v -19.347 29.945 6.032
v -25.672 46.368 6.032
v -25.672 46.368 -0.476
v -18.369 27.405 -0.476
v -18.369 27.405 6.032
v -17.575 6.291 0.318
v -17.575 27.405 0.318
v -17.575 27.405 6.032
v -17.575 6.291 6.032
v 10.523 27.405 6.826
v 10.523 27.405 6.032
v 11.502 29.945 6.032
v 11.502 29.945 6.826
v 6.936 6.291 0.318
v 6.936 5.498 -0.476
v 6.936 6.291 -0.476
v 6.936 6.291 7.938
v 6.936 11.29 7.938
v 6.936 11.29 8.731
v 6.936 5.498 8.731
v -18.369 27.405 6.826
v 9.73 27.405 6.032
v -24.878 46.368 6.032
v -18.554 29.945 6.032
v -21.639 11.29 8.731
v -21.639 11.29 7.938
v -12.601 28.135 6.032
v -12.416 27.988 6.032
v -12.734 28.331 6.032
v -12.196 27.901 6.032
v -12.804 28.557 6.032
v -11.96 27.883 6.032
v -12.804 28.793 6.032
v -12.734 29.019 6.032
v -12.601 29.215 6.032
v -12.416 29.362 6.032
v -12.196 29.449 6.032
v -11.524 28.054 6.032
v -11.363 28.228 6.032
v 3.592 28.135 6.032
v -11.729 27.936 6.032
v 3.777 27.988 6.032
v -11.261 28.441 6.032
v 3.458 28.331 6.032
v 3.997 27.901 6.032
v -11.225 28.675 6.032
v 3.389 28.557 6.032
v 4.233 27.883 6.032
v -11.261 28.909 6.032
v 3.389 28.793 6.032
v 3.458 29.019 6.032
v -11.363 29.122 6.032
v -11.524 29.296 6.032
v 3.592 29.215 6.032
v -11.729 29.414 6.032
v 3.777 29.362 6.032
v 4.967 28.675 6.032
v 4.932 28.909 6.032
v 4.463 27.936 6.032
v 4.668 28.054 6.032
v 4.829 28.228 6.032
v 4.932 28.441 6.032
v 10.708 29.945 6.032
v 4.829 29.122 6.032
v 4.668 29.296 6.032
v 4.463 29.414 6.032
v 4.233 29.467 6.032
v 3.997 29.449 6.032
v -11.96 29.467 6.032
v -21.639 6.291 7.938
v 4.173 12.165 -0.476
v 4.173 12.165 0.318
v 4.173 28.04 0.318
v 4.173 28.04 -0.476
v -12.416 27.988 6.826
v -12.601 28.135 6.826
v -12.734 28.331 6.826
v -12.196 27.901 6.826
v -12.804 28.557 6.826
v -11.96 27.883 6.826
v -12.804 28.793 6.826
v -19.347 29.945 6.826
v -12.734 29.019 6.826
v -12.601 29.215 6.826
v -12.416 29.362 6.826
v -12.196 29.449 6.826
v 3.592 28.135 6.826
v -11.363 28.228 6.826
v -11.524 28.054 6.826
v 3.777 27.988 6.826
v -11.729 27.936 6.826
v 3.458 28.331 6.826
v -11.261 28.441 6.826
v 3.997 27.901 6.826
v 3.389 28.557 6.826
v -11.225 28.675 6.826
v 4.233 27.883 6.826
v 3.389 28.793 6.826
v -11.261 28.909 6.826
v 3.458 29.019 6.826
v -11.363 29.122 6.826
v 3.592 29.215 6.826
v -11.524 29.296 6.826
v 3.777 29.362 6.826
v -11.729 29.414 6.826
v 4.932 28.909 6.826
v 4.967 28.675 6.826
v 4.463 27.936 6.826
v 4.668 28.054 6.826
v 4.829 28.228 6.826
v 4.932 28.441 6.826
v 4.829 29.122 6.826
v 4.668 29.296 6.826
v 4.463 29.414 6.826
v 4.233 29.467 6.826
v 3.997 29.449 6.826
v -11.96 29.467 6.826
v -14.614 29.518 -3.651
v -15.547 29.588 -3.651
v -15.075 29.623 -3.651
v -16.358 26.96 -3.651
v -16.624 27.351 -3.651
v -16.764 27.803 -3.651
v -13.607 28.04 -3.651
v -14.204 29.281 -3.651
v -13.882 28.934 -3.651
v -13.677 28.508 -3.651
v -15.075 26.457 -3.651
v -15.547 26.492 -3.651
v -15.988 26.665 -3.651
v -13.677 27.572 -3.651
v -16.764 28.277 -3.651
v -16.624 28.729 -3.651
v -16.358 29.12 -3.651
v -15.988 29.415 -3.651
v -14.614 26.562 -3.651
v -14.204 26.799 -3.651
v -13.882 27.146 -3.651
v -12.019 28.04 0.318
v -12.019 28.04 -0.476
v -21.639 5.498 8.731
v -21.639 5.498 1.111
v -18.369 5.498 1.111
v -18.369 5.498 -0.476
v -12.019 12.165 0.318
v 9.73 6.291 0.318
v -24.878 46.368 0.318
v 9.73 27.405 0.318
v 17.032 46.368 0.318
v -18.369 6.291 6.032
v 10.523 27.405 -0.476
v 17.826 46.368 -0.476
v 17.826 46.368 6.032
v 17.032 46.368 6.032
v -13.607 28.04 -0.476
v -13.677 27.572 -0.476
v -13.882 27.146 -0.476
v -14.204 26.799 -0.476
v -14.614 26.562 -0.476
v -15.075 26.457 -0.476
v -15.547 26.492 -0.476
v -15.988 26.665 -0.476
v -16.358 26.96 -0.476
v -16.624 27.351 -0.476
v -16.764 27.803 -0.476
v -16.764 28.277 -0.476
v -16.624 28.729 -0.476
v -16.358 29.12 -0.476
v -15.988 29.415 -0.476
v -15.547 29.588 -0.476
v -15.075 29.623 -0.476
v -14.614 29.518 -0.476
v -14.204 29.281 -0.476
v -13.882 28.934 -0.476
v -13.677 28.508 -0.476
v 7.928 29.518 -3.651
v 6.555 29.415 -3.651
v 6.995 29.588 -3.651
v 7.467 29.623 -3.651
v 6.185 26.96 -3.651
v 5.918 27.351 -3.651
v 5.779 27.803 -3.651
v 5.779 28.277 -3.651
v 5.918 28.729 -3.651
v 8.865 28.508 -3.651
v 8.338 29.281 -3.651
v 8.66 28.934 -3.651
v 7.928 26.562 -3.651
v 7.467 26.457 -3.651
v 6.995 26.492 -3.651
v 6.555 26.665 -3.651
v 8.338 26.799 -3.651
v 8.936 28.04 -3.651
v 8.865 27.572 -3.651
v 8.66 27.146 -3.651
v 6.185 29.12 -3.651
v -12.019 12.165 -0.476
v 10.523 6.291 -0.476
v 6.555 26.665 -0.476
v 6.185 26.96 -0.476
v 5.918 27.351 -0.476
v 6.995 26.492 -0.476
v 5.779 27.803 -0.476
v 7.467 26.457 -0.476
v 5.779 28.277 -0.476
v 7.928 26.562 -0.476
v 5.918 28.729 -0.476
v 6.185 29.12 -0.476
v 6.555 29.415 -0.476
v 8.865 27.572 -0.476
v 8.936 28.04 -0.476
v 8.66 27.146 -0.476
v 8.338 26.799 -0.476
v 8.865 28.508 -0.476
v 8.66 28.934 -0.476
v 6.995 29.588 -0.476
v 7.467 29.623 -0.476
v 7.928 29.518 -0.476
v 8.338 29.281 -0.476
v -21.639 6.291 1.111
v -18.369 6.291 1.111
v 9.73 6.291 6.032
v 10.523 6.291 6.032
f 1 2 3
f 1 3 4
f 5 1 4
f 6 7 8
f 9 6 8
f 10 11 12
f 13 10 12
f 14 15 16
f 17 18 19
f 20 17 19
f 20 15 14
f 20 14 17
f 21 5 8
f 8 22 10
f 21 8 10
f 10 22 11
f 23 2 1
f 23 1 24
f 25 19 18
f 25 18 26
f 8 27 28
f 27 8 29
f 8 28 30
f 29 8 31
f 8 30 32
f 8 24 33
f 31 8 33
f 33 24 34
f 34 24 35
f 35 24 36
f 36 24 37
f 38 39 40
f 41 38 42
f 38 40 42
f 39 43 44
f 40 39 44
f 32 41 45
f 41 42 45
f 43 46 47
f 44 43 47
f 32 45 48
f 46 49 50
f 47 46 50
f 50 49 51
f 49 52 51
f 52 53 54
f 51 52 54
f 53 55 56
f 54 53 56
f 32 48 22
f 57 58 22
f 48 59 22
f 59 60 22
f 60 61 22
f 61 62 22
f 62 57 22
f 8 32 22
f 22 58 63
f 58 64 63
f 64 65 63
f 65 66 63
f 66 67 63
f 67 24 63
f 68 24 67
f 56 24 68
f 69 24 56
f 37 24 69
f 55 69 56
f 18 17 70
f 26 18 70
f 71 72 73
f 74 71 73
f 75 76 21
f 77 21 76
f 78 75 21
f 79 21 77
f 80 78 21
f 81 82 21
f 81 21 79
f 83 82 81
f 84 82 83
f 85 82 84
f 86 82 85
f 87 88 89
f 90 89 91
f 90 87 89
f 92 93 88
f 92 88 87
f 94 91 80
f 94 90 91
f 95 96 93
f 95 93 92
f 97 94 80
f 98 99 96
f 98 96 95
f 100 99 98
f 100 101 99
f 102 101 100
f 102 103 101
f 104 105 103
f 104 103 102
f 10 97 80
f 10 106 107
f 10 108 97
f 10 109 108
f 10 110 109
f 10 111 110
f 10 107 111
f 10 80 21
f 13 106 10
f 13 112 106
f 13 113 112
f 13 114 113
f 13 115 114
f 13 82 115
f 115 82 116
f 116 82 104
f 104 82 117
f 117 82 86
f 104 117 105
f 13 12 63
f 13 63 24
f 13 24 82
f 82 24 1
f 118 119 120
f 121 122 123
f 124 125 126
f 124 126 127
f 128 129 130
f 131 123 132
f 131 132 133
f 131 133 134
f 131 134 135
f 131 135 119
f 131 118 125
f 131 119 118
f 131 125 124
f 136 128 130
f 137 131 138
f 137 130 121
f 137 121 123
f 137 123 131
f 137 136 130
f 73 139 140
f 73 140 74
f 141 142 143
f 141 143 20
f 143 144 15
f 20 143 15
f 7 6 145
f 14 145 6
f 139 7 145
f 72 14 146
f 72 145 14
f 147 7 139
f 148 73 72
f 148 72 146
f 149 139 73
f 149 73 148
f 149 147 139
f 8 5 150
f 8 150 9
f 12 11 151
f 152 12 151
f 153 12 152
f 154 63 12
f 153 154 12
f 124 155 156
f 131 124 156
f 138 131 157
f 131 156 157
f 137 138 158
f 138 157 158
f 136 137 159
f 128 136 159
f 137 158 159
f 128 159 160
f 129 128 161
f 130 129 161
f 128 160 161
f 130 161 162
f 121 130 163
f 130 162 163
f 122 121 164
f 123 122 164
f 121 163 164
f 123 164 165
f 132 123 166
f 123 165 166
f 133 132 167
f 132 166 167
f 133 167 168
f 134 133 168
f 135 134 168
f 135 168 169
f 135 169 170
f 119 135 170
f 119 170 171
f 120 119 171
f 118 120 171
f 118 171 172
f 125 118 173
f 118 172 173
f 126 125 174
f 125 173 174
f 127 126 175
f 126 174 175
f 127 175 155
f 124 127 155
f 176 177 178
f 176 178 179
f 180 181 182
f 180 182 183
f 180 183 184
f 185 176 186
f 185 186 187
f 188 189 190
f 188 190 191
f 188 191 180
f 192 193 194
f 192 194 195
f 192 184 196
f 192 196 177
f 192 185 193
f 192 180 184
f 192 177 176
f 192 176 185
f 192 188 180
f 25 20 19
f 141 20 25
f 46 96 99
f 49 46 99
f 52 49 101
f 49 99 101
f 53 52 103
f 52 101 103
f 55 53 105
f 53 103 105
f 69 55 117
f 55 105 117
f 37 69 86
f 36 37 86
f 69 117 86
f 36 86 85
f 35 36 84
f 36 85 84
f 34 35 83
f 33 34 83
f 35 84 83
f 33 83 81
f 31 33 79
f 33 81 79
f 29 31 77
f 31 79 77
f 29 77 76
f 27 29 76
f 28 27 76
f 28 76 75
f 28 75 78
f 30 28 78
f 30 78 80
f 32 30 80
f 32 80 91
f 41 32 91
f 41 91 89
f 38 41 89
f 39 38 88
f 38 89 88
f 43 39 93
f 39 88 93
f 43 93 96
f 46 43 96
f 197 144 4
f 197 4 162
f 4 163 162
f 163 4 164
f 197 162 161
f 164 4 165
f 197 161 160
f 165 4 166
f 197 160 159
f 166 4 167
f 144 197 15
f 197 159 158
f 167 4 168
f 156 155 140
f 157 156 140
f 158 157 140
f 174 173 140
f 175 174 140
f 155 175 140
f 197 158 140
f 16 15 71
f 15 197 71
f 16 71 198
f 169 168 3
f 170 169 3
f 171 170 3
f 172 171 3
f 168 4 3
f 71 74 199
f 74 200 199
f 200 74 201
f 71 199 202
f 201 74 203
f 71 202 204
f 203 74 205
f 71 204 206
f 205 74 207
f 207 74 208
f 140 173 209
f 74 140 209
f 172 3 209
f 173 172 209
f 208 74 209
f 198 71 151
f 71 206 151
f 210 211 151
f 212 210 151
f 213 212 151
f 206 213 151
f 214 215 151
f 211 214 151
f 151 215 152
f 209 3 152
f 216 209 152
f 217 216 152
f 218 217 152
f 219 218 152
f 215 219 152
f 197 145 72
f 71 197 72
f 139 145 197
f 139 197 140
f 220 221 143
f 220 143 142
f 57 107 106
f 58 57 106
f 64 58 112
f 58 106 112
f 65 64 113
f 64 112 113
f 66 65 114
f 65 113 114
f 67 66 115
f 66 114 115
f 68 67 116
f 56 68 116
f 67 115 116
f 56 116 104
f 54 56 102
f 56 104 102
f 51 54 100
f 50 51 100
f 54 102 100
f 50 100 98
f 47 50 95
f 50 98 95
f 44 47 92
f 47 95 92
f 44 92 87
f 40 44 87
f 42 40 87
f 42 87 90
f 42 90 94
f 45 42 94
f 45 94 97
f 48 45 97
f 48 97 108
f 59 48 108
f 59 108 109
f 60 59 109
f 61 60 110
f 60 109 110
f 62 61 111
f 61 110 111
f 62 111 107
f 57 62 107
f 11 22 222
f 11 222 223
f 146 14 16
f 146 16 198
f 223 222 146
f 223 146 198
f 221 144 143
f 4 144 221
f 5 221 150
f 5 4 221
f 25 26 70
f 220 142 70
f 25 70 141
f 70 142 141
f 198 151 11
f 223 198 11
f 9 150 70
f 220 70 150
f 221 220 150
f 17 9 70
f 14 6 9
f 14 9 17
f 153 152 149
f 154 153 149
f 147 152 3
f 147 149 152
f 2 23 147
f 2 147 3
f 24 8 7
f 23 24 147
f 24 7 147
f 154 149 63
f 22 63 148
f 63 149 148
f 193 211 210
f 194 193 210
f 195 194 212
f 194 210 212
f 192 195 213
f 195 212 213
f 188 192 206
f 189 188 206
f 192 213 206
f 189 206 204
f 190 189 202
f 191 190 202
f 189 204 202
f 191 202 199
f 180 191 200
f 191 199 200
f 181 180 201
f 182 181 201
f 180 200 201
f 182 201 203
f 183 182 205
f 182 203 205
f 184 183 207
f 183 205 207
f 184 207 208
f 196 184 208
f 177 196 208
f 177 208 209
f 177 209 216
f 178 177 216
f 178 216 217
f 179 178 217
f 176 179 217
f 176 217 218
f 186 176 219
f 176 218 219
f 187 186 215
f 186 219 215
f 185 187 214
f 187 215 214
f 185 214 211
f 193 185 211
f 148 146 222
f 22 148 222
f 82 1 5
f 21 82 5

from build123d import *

# Parameters (mm, degrees)
F0_W      = 16.1925
F0_H      = 15.875
F1_DEPTH  = 0.3175
F3_DEPTH  = 5.715
F5_DEPTH  = 0.79375
F6_R      = 0.79375
F7_DEPTH  = 0.79375
F8_DEPTH  = 0.3175
F9_W      = 1.5875
F9_H      = 0.635
F10_DEPTH = 1.5875
F11_DEPTH = 0.3175
F12_W     = 1.5875
F12_H     = 1.5875
F13_DEPTH = 0.79375
F14_DEPTH = 0.15875
F15_R     = 0.5
F16_DEPTH = 25.4
F17_R     = 1.5875
F18_DEPTH = 3.175
F19_DEPTH = 1.5875
F20_DEPTH = 12.7
F21_R     = 0.5
F22_DEPTH = 25.30475
F23_W     = 1.5875
F23_H     = 1.5875
F24_DEPTH = 3.27025
F25_W     = 28.575
F25_H     = 0.79375
F26_DEPTH = 7.62
F27_DEPTH = 0.79375
F28_DEPTH = 0.79375
F29_DEPTH = 0.79375
F30_DEPTH = 25.4
F31_W     = 28.575
F31_H     = 0.79375
F32_DEPTH = 4.998339


with BuildPart() as f1:
    # F0 (on Top) → F1 (new body)
    with BuildSketch(Plane.XY):
        Polygon((-25.671613648, 46.3675076752), (-18.369113648, 27.4050211887), (-18.369113648, 7.0850211887), (10.523386352, 7.0850211887), (10.523386352, 27.4050211887), (17.825886352, 46.3675076752), align=None)
        with Locations((-3.922863648, 20.1025211887)):
            Rectangle(F0_W, F0_H, mode=Mode.SUBTRACT)
    extrude(amount=F1_DEPTH)

    # F2 (on face) → F3 (join)
    with BuildSketch(Plane.XY.offset(0.3175)):
        Polygon((17.825886352, 46.3675076752), (17.032136352, 46.3675076752), (9.729636352, 27.4050211887), (9.729636352, 7.0850211887), (10.523386352, 7.0850211887), (10.523386352, 27.4050211887), align=None)
        Polygon((-24.877863648, 46.3675076752), (-25.671613648, 46.3675076752), (-18.369113648, 27.4050211887), (-18.369113648, 7.0850211887), (-17.575363648, 7.0850211887), (-17.575363648, 27.4050211887), align=None)
    extrude(amount=F3_DEPTH)

    # F4 (on face) → F5 (join)
    with BuildSketch(Plane.XY.offset(6.0325)):
        Polygon((-19.3472738705, 29.9450211887), (-18.369113648, 27.4050211887), (10.523386352, 27.4050211887), (11.5015465745, 29.9450211887), align=None)
    extrude(amount=F5_DEPTH)

    # F6 (on face) → F7 (cut)
    with BuildSketch(Plane.XY.offset(6.82625)):
        with Locations((-12.019113648, 28.6750211887)):
            Circle(F6_R)
        with Locations((4.173386352, 28.6750211887)):
            Circle(F6_R)
    extrude(amount=-F7_DEPTH, mode=Mode.SUBTRACT)

    # F8 (add): a face of the model
    f8_faces = [f1.faces().sort_by_distance(p)[0] for p in [
        (-3.922863648, 30.216271867, 0),
    ]]
    extrude(f8_faces, amount=F8_DEPTH)

    # F9 (on face) → F10 (join)
    with BuildSketch(Plane.XZ.offset(-7.0850211887)):
        Polygon((-17.575363648, 0.3175), (-18.369113648, 0.3175), (-18.369113648, -0.3175), (-16.781613648, -0.3175), (-16.781613648, 0.3175), align=None)
        with Locations((-14.400363648, 0)):
            Rectangle(F9_W, F9_H)
        with Locations((1.379386352, 0)):
            Rectangle(F9_W, F9_H)
        with Locations((4.554386352, 0)):
            Rectangle(F9_W, F9_H)
    extrude(amount=F10_DEPTH)

    # F11 (add): a face of the model
    f11_faces = [f1.faces().sort_by_distance(p)[0] for p in [
        (-3.9482759262, 29.9813117116, -0.3175),
    ]]
    extrude(f11_faces, amount=F11_DEPTH)

    # F12 (on face) → F13 (join)
    with BuildSketch(Plane.XY.offset(0.3175)):
        with Locations((-17.575363648, 6.2912711887)):
            Rectangle(F12_W, F12_H)
        with Locations((-14.400363648, 6.2912711887)):
            Rectangle(F12_W, F12_H)
        with Locations((1.379386352, 6.2912711887)):
            Rectangle(F12_W, F12_H)
        with Locations((4.554386352, 6.2912711887)):
            Rectangle(F12_W, F12_H)
    extrude(amount=F13_DEPTH)

    # F14 (cut): a face of the model
    f14_faces = [f1.faces().sort_by_distance(p)[0] for p in [
        (-3.9482759262, 29.9813117116, -0.635),
    ]]
    extrude(f14_faces, amount=-F14_DEPTH, mode=Mode.SUBTRACT)

    # F15 (on face) → F16 (cut)
    with BuildSketch(Plane(origin=(-18.369113648, 0, 0), x_dir=(0, -1, 0), z_dir=(-1, 0, 0))):
        with Locations((-6.2912711887, 0.3175)):
            Circle(F15_R)
    extrude(amount=-F16_DEPTH, mode=Mode.SUBTRACT)

    # F17 (on face) → F18 (join)
    with BuildSketch(Plane(origin=(0, 0, -0.47625), x_dir=(1, 0, 0), z_dir=(0, 0, -1))):
        with Locations((-15.194113648, -28.0400211887)):
            Circle(F17_R)
        with Locations((7.348386352, -28.0400211887)):
            Circle(F17_R)
    extrude(amount=F18_DEPTH)

    # F19 (add): faces of the model
    f19_faces = [f1.faces().sort_by_distance(p)[0] for p in [
        (5.348136352, 7.0625705484, -0.079375),
        (2.173136352, 7.0625705484, -0.079375),
        (-16.781613648, 7.0625705484, -0.079375),
        (-13.606613648, 7.0625705484, -0.079375),
    ]]
    extrude(f19_faces, amount=F19_DEPTH)

    # F20 (add): a face of the model
    f20_faces = [f1.faces().sort_by_distance(p)[0] for p in [
        (-12.019113648, 6.2912711887, -0.4537993597),
    ]]
    extrude(f20_faces, amount=F20_DEPTH)

    # F21 (on face) → F22 (join)
    with BuildSketch(Plane.YZ.offset(6.935636352)):
        with Locations((6.2912711887, 0.3175)):
            Circle(F21_R)
    extrude(amount=-F22_DEPTH)

    # F23 (on face) → F24 (join)
    with BuildSketch(Plane(origin=(-18.369113648, 0, 0), x_dir=(0, -1, 0), z_dir=(-1, 0, 0))):
        with Locations((-6.2912711887, 0.3175)):
            Rectangle(F23_W, F23_H)
    extrude(amount=F24_DEPTH)

    # F25 (on face) → F26 (join)
    with BuildSketch(Plane.XY.offset(1.11125)):
        with Locations((-7.351863648, 5.8943961887)):
            Rectangle(F25_W, F25_H)
    extrude(amount=F26_DEPTH)

    # F27 (cut): a face of the model
    f27_faces = [f1.faces().sort_by_distance(p)[0] for p in [
        (-5.319863648, 7.0850211887, 0.714375),
    ]]
    extrude(f27_faces, amount=-F27_DEPTH, mode=Mode.SUBTRACT)

    # F28 (add): a face of the model
    f28_faces = [f1.faces().sort_by_distance(p)[0] for p in [
        (-17.972238648, 7.0850211887, 3.571875),
    ]]
    extrude(f28_faces, amount=F28_DEPTH)

    # F29 (add): a face of the model
    f29_faces = [f1.faces().sort_by_distance(p)[0] for p in [
        (8.729511352, 7.0850211887, -0.4019292246),
    ]]
    extrude(f29_faces, amount=F29_DEPTH)

    # F30 (cut): a face of the model
    f30_faces = [f1.faces().sort_by_distance(p)[0] for p in [
        (-20.004238648, 7.0850211887, 0.3175),
    ]]
    extrude(f30_faces, amount=-F30_DEPTH, mode=Mode.SUBTRACT)

    # F31 (on face) → F32 (join)
    with BuildSketch(Plane(origin=(0, 6.2912711887, 0), x_dir=(-1, 0, 0), z_dir=(0, 1, 0))):
        with Locations((7.351863648, 8.334375)):
            Rectangle(F31_W, F31_H)
    extrude(amount=F32_DEPTH)


solid = f1.part
